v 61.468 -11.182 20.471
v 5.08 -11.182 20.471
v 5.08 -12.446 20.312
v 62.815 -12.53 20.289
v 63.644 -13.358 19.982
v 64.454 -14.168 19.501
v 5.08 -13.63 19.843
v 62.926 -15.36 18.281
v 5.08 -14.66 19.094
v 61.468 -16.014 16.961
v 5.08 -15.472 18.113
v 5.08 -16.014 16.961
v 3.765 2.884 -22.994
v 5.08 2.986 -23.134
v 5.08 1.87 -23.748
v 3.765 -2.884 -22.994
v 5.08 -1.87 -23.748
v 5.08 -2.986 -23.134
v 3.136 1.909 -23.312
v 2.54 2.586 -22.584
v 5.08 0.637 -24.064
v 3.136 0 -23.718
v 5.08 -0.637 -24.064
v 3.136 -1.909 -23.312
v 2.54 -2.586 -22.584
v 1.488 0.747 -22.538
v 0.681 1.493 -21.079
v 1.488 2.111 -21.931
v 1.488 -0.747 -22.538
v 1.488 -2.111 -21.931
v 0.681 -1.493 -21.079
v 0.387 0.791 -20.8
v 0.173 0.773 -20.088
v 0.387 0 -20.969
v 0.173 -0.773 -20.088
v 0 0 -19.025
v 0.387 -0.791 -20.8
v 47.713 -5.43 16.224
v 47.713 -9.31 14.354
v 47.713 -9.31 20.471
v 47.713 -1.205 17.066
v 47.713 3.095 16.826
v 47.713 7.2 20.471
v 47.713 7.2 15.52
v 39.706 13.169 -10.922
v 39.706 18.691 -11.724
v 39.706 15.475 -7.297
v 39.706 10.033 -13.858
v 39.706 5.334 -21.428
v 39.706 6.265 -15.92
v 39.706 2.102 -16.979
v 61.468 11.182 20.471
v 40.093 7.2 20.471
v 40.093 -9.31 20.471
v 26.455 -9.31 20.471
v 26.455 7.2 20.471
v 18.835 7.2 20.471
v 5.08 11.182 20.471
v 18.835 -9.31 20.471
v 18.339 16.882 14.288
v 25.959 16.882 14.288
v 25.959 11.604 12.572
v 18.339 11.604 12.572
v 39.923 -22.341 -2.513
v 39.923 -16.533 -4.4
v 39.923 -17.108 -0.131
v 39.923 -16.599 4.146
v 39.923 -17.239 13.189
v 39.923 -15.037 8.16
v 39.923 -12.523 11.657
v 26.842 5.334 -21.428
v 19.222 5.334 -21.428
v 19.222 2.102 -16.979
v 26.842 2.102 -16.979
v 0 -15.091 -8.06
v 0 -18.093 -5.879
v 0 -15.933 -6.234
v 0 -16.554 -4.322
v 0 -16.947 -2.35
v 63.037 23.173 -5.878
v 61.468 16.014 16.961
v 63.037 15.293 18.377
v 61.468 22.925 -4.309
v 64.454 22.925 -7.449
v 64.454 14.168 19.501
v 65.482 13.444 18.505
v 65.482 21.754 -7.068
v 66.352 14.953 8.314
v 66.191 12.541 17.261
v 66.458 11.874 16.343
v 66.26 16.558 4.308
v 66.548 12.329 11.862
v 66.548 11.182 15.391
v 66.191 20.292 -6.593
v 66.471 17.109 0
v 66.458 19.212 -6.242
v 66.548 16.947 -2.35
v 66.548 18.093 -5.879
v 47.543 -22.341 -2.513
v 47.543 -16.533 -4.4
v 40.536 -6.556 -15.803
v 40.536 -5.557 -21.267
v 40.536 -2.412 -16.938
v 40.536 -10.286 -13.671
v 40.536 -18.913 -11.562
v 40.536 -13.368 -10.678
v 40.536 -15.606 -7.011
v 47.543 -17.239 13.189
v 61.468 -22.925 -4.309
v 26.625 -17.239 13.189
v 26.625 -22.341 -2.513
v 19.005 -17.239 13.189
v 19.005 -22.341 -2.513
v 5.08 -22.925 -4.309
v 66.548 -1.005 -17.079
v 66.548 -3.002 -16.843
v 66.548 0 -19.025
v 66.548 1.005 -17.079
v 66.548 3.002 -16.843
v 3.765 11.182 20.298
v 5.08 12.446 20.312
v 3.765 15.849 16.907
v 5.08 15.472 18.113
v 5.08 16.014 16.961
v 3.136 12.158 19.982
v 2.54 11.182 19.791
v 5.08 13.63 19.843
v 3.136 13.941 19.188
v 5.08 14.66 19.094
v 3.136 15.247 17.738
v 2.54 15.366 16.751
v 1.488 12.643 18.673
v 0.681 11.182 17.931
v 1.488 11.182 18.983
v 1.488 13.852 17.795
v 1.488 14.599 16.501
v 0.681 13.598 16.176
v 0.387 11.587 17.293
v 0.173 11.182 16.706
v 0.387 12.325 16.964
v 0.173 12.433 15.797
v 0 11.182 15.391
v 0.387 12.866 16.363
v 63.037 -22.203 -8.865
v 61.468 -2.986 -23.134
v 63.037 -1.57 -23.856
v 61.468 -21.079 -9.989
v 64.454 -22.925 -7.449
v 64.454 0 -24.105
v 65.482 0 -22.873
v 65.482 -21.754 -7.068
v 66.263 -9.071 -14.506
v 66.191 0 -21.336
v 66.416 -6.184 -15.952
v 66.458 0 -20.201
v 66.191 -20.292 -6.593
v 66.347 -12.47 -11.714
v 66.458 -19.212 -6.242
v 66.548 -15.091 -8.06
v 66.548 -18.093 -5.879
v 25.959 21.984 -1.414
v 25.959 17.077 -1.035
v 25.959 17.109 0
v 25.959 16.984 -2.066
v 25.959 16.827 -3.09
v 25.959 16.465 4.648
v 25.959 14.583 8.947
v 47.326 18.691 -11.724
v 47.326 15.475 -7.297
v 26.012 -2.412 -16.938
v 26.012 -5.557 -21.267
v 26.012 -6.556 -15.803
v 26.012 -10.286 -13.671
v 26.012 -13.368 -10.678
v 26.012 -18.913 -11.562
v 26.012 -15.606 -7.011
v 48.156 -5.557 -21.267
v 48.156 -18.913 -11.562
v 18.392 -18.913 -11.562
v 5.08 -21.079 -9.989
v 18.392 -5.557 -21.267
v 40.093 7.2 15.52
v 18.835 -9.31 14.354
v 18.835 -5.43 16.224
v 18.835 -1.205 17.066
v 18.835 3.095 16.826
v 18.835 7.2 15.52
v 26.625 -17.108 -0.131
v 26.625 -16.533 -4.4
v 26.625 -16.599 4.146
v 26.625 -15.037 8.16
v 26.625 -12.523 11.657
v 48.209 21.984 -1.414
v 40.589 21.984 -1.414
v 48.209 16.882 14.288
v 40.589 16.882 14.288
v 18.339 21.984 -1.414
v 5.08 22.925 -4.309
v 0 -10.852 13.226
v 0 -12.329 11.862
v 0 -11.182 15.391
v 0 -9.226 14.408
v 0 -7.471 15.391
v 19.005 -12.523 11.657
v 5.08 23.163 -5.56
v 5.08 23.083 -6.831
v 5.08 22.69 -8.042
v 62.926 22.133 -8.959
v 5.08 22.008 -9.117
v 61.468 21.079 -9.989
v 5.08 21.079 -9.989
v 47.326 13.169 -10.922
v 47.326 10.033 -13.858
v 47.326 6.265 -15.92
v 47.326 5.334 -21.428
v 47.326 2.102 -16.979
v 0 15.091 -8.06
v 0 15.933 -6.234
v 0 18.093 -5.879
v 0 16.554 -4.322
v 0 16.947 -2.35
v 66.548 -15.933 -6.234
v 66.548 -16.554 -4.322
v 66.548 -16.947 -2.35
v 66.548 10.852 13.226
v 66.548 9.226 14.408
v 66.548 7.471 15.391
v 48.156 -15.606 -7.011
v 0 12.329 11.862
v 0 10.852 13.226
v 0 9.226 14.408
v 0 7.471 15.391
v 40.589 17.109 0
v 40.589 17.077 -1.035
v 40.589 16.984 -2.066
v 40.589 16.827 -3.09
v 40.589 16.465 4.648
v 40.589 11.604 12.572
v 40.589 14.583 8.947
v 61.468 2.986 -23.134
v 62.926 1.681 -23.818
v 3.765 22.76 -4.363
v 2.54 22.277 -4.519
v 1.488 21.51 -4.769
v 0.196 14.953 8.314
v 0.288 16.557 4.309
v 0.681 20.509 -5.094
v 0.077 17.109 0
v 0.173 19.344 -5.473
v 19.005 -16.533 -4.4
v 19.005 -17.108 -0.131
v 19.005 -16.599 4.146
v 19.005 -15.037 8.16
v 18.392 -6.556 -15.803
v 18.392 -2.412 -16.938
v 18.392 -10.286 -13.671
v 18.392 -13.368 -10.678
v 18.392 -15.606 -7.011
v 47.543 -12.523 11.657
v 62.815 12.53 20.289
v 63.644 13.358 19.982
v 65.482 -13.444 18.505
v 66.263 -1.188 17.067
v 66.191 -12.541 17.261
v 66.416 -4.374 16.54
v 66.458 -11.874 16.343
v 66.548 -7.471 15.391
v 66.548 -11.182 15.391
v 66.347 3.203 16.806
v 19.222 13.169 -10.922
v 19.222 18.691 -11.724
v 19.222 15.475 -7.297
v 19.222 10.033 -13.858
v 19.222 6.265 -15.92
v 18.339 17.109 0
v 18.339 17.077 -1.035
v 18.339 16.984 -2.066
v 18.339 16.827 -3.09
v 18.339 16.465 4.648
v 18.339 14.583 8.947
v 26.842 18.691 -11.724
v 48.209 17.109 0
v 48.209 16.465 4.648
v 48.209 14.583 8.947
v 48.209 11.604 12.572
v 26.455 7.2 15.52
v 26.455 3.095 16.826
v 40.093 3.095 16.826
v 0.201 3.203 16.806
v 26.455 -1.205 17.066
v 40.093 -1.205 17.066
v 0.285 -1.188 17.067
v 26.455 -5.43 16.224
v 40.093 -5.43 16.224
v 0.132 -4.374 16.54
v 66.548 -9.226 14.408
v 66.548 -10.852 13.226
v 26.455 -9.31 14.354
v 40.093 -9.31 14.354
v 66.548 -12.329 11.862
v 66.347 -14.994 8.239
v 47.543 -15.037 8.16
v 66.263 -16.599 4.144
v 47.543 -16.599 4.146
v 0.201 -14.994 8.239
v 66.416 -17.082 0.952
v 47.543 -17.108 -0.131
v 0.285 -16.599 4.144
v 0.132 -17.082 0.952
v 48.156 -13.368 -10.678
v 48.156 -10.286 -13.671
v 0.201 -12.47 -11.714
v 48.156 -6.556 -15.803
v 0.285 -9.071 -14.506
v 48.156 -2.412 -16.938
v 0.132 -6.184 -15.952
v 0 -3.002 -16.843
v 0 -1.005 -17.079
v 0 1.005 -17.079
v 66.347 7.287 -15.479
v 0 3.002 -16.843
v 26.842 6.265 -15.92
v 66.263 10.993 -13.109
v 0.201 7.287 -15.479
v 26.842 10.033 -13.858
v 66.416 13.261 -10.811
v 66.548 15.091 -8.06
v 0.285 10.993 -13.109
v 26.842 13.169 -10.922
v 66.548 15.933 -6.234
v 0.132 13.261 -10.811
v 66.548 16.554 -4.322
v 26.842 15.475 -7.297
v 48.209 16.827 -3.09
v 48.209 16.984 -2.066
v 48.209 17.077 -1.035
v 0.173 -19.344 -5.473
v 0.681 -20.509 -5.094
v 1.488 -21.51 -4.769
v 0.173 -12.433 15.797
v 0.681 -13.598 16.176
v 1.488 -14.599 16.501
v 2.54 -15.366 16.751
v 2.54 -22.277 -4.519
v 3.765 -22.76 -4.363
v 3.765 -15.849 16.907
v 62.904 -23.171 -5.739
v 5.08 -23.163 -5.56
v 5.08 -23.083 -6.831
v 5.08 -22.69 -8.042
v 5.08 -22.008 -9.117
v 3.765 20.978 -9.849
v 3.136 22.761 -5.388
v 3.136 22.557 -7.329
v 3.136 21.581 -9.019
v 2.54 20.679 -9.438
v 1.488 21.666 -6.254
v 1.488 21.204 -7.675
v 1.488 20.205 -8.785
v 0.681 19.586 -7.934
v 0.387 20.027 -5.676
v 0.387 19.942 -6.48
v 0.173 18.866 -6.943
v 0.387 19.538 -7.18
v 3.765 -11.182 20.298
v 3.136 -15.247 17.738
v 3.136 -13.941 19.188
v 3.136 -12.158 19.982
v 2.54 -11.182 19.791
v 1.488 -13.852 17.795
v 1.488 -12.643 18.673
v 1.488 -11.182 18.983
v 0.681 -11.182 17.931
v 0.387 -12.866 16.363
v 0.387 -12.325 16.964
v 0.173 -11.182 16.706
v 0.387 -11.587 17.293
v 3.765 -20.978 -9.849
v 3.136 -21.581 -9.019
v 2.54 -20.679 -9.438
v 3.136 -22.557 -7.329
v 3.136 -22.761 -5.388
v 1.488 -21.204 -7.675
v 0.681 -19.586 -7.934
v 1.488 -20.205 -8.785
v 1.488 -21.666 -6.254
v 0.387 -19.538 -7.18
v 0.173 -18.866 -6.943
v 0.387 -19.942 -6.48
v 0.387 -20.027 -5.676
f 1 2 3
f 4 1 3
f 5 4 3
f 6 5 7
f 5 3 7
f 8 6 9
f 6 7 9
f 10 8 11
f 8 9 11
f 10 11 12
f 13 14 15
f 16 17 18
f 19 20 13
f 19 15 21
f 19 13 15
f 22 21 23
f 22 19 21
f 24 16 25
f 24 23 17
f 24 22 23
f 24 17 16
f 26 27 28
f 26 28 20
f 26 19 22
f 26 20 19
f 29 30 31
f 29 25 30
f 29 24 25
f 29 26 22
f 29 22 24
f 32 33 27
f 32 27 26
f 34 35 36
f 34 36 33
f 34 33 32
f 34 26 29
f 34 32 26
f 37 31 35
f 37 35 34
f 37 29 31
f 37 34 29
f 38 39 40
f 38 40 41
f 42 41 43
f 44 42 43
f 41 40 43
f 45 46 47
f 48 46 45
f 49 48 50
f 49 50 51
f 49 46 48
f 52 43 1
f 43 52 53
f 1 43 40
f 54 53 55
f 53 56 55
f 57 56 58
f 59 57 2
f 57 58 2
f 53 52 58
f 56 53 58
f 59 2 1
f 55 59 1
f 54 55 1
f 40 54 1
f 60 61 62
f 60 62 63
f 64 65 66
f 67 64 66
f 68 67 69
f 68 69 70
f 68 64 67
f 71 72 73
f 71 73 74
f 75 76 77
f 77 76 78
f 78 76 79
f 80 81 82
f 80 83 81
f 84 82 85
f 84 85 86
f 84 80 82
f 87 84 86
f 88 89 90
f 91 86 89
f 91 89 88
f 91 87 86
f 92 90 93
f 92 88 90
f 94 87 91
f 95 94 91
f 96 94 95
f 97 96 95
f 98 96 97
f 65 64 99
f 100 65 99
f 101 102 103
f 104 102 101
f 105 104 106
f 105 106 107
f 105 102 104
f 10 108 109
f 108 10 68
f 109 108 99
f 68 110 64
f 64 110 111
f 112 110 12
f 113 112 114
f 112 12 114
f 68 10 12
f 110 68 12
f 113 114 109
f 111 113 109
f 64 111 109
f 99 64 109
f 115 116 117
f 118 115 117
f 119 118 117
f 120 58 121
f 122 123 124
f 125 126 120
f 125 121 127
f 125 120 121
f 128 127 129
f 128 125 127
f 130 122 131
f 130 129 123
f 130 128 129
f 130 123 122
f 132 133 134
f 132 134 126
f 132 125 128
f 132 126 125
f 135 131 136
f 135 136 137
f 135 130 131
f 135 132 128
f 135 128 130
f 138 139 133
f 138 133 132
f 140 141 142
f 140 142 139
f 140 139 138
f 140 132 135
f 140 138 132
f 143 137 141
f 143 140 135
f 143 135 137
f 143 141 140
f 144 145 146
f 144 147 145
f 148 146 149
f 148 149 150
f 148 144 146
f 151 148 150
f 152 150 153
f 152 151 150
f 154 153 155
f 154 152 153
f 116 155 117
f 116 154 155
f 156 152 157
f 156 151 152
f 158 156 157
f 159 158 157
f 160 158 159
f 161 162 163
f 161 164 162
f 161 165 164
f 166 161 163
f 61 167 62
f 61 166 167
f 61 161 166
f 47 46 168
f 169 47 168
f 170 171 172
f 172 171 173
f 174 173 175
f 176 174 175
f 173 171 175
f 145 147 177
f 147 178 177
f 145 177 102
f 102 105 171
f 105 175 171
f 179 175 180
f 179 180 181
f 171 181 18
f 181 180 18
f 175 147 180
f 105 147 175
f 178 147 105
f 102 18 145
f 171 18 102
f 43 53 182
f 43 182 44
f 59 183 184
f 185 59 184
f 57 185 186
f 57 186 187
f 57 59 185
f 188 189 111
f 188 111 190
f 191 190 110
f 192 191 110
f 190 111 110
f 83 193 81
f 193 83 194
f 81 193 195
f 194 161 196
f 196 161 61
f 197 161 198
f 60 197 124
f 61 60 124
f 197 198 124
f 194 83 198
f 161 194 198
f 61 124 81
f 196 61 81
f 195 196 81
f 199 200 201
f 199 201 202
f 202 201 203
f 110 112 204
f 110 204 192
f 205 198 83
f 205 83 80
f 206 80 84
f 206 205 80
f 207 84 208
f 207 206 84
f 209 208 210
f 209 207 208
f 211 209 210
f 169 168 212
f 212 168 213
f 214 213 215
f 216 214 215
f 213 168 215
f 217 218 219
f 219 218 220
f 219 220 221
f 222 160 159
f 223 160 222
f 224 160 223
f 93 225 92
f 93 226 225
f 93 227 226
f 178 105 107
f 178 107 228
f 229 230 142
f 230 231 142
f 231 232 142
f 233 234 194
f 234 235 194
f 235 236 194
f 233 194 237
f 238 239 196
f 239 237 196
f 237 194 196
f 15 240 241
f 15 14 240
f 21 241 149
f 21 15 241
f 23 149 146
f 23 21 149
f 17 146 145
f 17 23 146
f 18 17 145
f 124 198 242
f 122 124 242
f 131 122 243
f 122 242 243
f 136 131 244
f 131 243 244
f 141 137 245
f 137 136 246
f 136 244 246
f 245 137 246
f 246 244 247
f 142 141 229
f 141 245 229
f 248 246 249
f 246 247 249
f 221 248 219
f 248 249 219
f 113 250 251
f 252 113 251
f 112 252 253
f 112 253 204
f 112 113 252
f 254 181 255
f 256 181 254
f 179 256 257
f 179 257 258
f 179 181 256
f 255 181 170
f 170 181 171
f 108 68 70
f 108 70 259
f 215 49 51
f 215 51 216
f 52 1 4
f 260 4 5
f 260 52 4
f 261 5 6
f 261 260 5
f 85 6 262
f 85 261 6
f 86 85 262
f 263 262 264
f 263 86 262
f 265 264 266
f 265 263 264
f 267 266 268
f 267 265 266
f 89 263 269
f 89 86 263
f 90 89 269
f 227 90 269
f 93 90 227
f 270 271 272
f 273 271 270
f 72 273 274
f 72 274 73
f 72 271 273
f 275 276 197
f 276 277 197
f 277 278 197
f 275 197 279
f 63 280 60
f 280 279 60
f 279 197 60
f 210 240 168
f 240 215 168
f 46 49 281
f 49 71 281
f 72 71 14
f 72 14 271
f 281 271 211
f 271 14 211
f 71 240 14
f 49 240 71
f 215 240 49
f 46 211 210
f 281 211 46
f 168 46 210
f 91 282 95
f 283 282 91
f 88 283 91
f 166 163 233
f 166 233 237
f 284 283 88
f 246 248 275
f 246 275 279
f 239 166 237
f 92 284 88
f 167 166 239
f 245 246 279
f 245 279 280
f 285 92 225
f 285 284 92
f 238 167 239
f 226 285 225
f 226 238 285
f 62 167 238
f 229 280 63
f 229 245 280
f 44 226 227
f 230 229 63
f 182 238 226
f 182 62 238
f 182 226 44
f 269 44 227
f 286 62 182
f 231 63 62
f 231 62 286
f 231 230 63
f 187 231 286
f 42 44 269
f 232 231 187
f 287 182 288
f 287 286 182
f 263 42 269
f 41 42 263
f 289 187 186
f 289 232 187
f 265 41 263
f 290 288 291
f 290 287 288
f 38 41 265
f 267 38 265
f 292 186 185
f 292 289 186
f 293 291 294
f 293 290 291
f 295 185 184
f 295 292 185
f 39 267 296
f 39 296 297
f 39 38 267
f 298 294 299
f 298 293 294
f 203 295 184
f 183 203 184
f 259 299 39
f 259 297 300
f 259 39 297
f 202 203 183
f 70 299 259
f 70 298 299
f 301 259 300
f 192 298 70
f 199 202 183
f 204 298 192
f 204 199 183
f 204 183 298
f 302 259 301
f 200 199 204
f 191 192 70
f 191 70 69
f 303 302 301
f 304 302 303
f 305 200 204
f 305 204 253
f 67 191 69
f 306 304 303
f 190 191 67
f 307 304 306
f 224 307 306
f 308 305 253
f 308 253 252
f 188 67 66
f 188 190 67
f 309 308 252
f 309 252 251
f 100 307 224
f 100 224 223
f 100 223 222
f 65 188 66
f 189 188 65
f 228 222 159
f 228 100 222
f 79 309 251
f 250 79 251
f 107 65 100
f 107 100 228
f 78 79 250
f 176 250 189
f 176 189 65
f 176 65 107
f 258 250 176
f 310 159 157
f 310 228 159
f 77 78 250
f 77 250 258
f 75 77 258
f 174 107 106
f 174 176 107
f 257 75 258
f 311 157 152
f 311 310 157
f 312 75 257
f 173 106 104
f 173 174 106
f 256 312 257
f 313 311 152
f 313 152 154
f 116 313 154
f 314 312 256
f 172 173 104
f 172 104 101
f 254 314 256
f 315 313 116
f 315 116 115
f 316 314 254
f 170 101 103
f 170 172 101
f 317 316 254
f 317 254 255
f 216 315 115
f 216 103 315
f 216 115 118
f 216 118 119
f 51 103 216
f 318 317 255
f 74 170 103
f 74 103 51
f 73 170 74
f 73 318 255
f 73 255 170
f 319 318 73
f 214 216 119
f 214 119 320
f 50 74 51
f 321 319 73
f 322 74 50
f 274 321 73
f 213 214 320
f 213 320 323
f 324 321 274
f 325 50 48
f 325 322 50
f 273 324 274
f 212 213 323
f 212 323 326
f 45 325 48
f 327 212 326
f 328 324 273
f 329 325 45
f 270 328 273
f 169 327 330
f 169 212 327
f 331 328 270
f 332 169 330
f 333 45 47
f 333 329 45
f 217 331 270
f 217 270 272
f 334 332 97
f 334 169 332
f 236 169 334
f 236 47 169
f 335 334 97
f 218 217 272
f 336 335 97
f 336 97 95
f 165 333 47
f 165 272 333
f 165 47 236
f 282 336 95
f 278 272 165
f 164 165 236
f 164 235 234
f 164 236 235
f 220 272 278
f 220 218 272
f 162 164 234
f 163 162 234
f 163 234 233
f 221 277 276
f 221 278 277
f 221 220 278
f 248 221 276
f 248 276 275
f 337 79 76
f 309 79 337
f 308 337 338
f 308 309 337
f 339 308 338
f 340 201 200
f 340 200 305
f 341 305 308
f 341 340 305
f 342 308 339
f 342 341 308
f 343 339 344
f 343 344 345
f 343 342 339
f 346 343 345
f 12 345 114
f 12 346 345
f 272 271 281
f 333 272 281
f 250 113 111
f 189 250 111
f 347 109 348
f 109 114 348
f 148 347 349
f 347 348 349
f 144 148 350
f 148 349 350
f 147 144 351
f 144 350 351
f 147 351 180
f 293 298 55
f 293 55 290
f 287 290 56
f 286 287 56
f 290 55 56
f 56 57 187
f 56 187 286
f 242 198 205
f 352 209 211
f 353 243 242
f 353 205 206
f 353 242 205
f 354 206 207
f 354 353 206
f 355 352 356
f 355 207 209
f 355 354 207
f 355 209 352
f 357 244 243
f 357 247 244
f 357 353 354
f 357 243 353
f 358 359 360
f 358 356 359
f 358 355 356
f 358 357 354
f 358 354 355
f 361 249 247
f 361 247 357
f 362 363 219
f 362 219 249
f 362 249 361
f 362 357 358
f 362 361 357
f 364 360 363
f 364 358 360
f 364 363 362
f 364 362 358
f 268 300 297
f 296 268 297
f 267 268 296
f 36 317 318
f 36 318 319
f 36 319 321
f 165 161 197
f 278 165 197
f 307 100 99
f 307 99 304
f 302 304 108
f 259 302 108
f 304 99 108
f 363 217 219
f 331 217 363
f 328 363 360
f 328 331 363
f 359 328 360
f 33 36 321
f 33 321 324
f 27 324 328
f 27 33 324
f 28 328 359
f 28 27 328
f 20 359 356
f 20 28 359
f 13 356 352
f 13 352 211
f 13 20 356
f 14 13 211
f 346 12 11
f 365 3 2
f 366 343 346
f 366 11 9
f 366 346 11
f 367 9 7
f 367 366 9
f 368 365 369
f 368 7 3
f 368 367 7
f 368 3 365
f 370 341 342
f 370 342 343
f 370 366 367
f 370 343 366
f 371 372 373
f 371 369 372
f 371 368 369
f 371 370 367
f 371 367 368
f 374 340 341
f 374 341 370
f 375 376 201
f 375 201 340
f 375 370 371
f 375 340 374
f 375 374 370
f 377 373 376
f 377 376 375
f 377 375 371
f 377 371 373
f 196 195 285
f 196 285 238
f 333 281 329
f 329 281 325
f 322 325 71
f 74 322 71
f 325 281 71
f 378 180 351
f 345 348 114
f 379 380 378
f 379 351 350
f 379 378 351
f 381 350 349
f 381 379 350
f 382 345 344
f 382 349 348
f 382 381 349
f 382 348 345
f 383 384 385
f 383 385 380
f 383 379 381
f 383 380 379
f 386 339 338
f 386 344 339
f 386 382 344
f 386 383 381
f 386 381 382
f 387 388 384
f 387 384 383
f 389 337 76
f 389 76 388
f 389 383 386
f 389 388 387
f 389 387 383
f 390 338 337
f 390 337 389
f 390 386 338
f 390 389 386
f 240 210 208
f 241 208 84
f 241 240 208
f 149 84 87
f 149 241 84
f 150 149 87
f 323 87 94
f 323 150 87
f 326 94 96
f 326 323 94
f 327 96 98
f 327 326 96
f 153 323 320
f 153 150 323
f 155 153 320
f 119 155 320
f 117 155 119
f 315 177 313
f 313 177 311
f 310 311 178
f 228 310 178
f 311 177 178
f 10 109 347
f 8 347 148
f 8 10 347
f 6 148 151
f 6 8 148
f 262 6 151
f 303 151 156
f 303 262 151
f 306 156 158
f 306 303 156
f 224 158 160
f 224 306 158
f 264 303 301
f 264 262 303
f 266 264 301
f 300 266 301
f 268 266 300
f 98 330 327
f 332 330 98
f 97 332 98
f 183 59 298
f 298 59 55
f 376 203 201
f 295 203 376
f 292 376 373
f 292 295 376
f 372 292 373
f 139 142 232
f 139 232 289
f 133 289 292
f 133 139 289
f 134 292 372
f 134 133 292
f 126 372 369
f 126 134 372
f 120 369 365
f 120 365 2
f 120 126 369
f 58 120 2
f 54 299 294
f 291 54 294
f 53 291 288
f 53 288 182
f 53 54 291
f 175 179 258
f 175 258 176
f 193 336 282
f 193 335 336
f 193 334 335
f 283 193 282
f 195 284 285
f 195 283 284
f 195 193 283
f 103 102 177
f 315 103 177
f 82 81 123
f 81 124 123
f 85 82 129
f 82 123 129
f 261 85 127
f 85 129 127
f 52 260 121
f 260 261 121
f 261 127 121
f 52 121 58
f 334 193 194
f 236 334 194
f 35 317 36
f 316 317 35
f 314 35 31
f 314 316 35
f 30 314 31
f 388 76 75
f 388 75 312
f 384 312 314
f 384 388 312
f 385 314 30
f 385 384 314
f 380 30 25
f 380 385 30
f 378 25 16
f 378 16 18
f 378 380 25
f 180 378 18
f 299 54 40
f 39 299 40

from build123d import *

# Parameters (mm, degrees)
F0_R         = 17.1087851354
F1_DEPTH     = 66.548
F2_T1_DEPTH  = 55.1463138897
F2_T3_DEPTH  = 55.1463138897
F2_T5_DEPTH  = 55.1463138897
F2_T7_DEPTH  = 55.1463138897
F2_T9_DEPTH  = 55.1463138897
F3_T1_DEPTH  = 22.3646418052
F3_T3_DEPTH  = 22.3646418052
F3_T5_DEPTH  = 22.3646418052
F3_T7_DEPTH  = 22.3646418052
F3_T9_DEPTH  = 22.3646418052
F3_T11_DEPTH = 65.6150901057
F3_T16_DEPTH = 5.1816
F3_T22_DEPTH = 5.1816
F3_T28_DEPTH = 5.1816
F3_T34_DEPTH = 5.1816
F3_T40_DEPTH = 5.1816
F4_W         = 7.62
F4_H         = 16.51
F5_DEPTH     = 7.874
F6_W         = 7.62
F6_H         = 16.51
F7_DEPTH     = 7.112
F8_W         = 7.62
F8_H         = 16.51
F9_DEPTH     = 12.192
F10_W        = 7.62
F10_H        = 16.51
F11_DEPTH    = 24.384
F12_W        = 7.62
F12_H        = 16.51
F13_DEPTH    = 25.4


# Not quite as in the source:
# - a fillet or chamfer that OpenCascade refuses, or shapes differently, is made with other operations: its cross-section is extruded or revolved along the edge and cut away or added


with BuildPart() as f1:
    # F0 (on Right) → F1 (new body)
    with BuildSketch(Plane.YZ):
        Polygon((14.8731569449, 20.4711443192), (-14.8731569449, 20.4711443192), (-24.0652734568, -7.8192813413), (0, -25.3037259558), (24.0652734568, -7.8192813413), align=None)
        Circle(F0_R, mode=Mode.SUBTRACT)
    extrude(amount=F1_DEPTH)

    # F2: fillet of radius 5.08 on 5 edges, made by hand

    # F2_s2 → F2_t1 (cut)
    with BuildSketch(Plane(origin=(0, 8.5205740845, 26.2236305872), x_dir=(1, 0, 0), z_dir=(0, -0.3090169944, -0.9510565163))):
        with BuildLine():
            ThreePointArc((61.468, 20.4711443192), (65.0601024484, 18.9832467676), (66.548, 15.3911443192))
            Line((66.548, 15.3911443192), (66.548, 20.4711443192))
            Line((66.548, 20.4711443192), (61.468, 20.4711443192))
        make_face()
    extrude(amount=F2_T1_DEPTH, mode=Mode.SUBTRACT)

    # F2_s4 → F2_t3 (cut)
    with BuildSketch(Plane.XZ.offset(-27.5731569449)):
        with BuildLine():
            ThreePointArc((61.468, 20.4711443192), (65.0601024484, 18.9832467676), (66.548, 15.3911443192))
            Line((66.548, 15.3911443192), (66.548, 20.4711443192))
            Line((66.548, 20.4711443192), (61.468, 20.4711443192))
        make_face()
    extrude(amount=F2_T3_DEPTH, mode=Mode.SUBTRACT)

    # F2_s6 → F2_t5 (cut)
    with BuildSketch(Plane(origin=(0, 8.5205740845, -26.2236305872), x_dir=(1, 0, 0), z_dir=(0, -0.3090169944, 0.9510565163))):
        with BuildLine():
            ThreePointArc((61.468, 20.4711443192), (65.0601024484, 18.9832467676), (66.548, 15.3911443192))
            Line((66.548, 15.3911443192), (66.548, 20.4711443192))
            Line((66.548, 20.4711443192), (61.468, 20.4711443192))
        make_face()
    extrude(amount=F2_T5_DEPTH, mode=Mode.SUBTRACT)

    # F2_s8 → F2_t7 (cut)
    with BuildSketch(Plane(origin=(0, -22.307152557, -16.2070950113), x_dir=(1, 0, 0), z_dir=(0, 0.8090169944, 0.5877852523))):
        with BuildLine():
            ThreePointArc((61.468, 20.4711443192), (65.0601024484, 18.9832467676), (66.548, 15.3911443192))
            Line((66.548, 15.3911443192), (66.548, 20.4711443192))
            Line((66.548, 20.4711443192), (61.468, 20.4711443192))
        make_face()
    extrude(amount=F2_T7_DEPTH, mode=Mode.SUBTRACT)

    # F2_s10 → F2_t9 (cut)
    with BuildSketch(Plane(origin=(0, -22.307152557, 16.2070950113), x_dir=(1, 0, 0), z_dir=(0, 0.8090169944, -0.5877852523))):
        with BuildLine():
            ThreePointArc((61.468, 20.4711443192), (65.0601024484, 18.9832467676), (66.548, 15.3911443192))
            Line((66.548, 15.3911443192), (66.548, 20.4711443192))
            Line((66.548, 20.4711443192), (61.468, 20.4711443192))
        make_face()
    extrude(amount=F2_T9_DEPTH, mode=Mode.SUBTRACT)

    # F3: fillet of radius 5.08 on 14 edges, made by hand

    # F3_s2 → F3_t1 (cut)
    with BuildSketch(Plane(origin=(0, 3.4555271955, -10.6350191617), x_dir=(1, 0, 0), z_dir=(0, -0.3090169944, 0.9510565163))):
        with BuildLine():
            ThreePointArc((5.08, 20.4711443192), (1.4878975516, 18.9832467676), (0, 15.3911443192))
            Line((0, 15.3911443192), (0, 20.4711443192))
            Line((0, 20.4711443192), (5.08, 20.4711443192))
        make_face()
    extrude(amount=F3_T1_DEPTH, mode=Mode.SUBTRACT)

    # F3_s4 → F3_t3 (cut)
    with BuildSketch(Plane.XZ.offset(-11.1823209026)):
        with BuildLine():
            ThreePointArc((0, 15.3911443192), (1.4878975516, 18.9832467676), (5.08, 20.4711443192))
            Line((5.08, 20.4711443192), (0, 20.4711443192))
            Line((0, 20.4711443192), (0, 15.3911443192))
        make_face()
    extrude(amount=F3_T3_DEPTH, mode=Mode.SUBTRACT)

    # F3_s6 → F3_t5 (cut)
    with BuildSketch(Plane(origin=(0, 3.4555271955, 10.6350191617), x_dir=(1, 0, 0), z_dir=(0, -0.3090169944, -0.9510565163))):
        with BuildLine():
            ThreePointArc((0, 15.3911443192), (1.4878975516, 18.9832467676), (5.08, 20.4711443192))
            Line((5.08, 20.4711443192), (0, 20.4711443192))
            Line((0, 20.4711443192), (0, 15.3911443192))
        make_face()
    extrude(amount=F3_T5_DEPTH, mode=Mode.SUBTRACT)

    # F3_s8 → F3_t7 (cut)
    with BuildSketch(Plane(origin=(0, -9.0466876467, 6.5728033129), x_dir=(1, 0, 0), z_dir=(0, 0.8090169944, -0.5877852523))):
        with BuildLine():
            ThreePointArc((0, 15.3911443192), (1.4878975516, 18.9832467676), (5.08, 20.4711443192))
            Line((5.08, 20.4711443192), (0, 20.4711443192))
            Line((0, 20.4711443192), (0, 15.3911443192))
        make_face()
    extrude(amount=F3_T7_DEPTH, mode=Mode.SUBTRACT)

    # F3_s10 → F3_t9 (cut)
    with BuildSketch(Plane(origin=(0, -9.0466876467, -6.5728033129), x_dir=(1, 0, 0), z_dir=(0, 0.8090169944, 0.5877852523))):
        with BuildLine():
            ThreePointArc((0, 15.3911443192), (1.4878975516, 18.9832467676), (5.08, 20.4711443192))
            Line((5.08, 20.4711443192), (0, 20.4711443192))
            Line((0, 20.4711443192), (0, 15.3911443192))
        make_face()
    extrude(amount=F3_T9_DEPTH, mode=Mode.SUBTRACT)

    # F3_s12 → F3_t11 (cut)
    with BuildSketch(Plane.YZ.offset(5.08)):
        with BuildLine():
            ThreePointArc((-22.9247423963, -4.3090876728), (-22.9247423963, -7.4487003356), (-21.0793243751, -9.9887003356))
            Line((-21.0793243751, -9.9887003356), (-24.0652734568, -7.8192813413))
            Line((-24.0652734568, -7.8192813413), (-22.9247423963, -4.3090876728))
        make_face()
        with BuildLine():
            ThreePointArc((-11.1823209026, 20.4711443192), (-14.1682699842, 19.5009506506), (-16.0136880054, 16.9609506506))
            Line((-16.0136880054, 16.9609506506), (-14.8731569449, 20.4711443192))
            Line((-14.8731569449, 20.4711443192), (-11.1823209026, 20.4711443192))
        make_face()
        with BuildLine():
            ThreePointArc((2.9859490816, -23.1343069615), (0, -24.1045006301), (-2.9859490816, -23.1343069615))
            Line((-2.9859490816, -23.1343069615), (0, -25.3037259558))
            Line((0, -25.3037259558), (2.9859490816, -23.1343069615))
        make_face()
        with BuildLine():
            ThreePointArc((22.9247423963, -4.3090876728), (22.9247423963, -7.4487003356), (21.0793243751, -9.9887003356))
            Line((21.0793243751, -9.9887003356), (24.0652734568, -7.8192813413))
            Line((24.0652734568, -7.8192813413), (22.9247423963, -4.3090876728))
        make_face()
        with BuildLine():
            ThreePointArc((16.0136880054, 16.9609506506), (14.1682699842, 19.5009506506), (11.1823209026, 20.4711443192))
            Line((11.1823209026, 20.4711443192), (14.8731569449, 20.4711443192))
            Line((14.8731569449, 20.4711443192), (16.0136880054, 16.9609506506))
        make_face()
    extrude(amount=F3_T11_DEPTH, mode=Mode.SUBTRACT)


with BuildPart() as f3_tool14:
    # F3_s15 → F3_t16 (new body)
    with BuildSketch(Plane.YZ.offset(5.08)):
        Polygon((18.0933752935, -5.8788940042), (21.1390433568, -10.0708964622), (24.18471142, -7.8580890881), (23.0213697383, -4.2776915461), align=None)
    extrude(amount=-F3_T16_DEPTH)

    # F3_s17 → F3_t18 (revolve, cut)
    with BuildSketch(Plane(origin=(5.08, 18.0933752935, -5.8788940042), x_dir=(0, -0.9510565163, 0.3090169944), z_dir=(0, -0.3090169944, -0.9510565163))):
        with BuildLine():
            ThreePointArc((0, -5.08), (5.08, 0), (0, 5.08))
            Line((0, 5.08), (0, -5.08))
        make_face()
    revolve(axis=Axis((5.08, 18.0933752935, -5.8788940042), (-1, 0, 0)), mode=Mode.SUBTRACT)


with BuildPart() as f1_1:
    add(f1.part)

    # F3_t13: cut F3_tool14
    add(f3_tool14.part, mode=Mode.SUBTRACT)


with BuildPart() as f3_tool20:
    # F3_s21 → F3_t22 (new body)
    with BuildSketch(Plane.YZ.offset(5.08)):
        Polygon((11.1823209026, 15.3911443192), (11.1823209026, 20.5727443192), (14.9469736657, 20.5727443192), (16.1103153474, 16.9923467773), align=None)
    extrude(amount=-F3_T22_DEPTH)

    # F3_s23 → F3_t24 (revolve, cut)
    with BuildSketch(Plane(origin=(5.08, 11.1823209026, 15.3911443192), x_dir=(0, -0.5877852523, -0.8090169944), z_dir=(0, 0.8090169944, -0.5877852523))):
        with BuildLine():
            ThreePointArc((0, -5.08), (5.08, 0), (0, 5.08))
            Line((0, 5.08), (0, -5.08))
        make_face()
    revolve(axis=Axis((5.08, 11.1823209026, 15.3911443192), (-1, 0, 0)), mode=Mode.SUBTRACT)


with BuildPart() as f1_2:
    add(f1_1.part)

    # F3_t19: cut F3_tool20
    add(f3_tool20.part, mode=Mode.SUBTRACT)


with BuildPart() as f3_tool26:
    # F3_s27 → F3_t28 (new body)
    with BuildSketch(Plane.YZ.offset(5.08)):
        Polygon((-11.1823209026, 15.3911443192), (-11.1823209026, 20.5727443192), (-14.9469736657, 20.5727443192), (-16.1103153474, 16.9923467773), align=None)
    extrude(amount=-F3_T28_DEPTH)

    # F3_s29 → F3_t30 (revolve, cut)
    with BuildSketch(Plane(origin=(5.08, -11.1823209026, 15.3911443192), x_dir=(0, 0.5877852523, -0.8090169944), z_dir=(0, 0.8090169944, 0.5877852523))):
        with BuildLine():
            ThreePointArc((0, -5.08), (5.08, 0), (0, 5.08))
            Line((0, 5.08), (0, -5.08))
        make_face()
    revolve(axis=Axis((5.08, -11.1823209026, 15.3911443192), (-1, 0, 0)), mode=Mode.SUBTRACT)


with BuildPart() as f1_3:
    add(f1_2.part)

    # F3_t25: cut F3_tool26
    add(f3_tool26.part, mode=Mode.SUBTRACT)


with BuildPart() as f3_tool32:
    # F3_s33 → F3_t34 (new body)
    with BuildSketch(Plane.YZ.offset(5.08)):
        Polygon((-18.0933752935, -5.8788940042), (-23.0213697383, -4.2776915461), (-24.18471142, -7.8580890881), (-21.1390433568, -10.0708964622), align=None)
    extrude(amount=-F3_T34_DEPTH)

    # F3_s35 → F3_t36 (revolve, cut)
    with BuildSketch(Plane(origin=(5.08, -18.0933752935, -5.8788940042), x_dir=(0, 0.9510565163, 0.3090169944), z_dir=(0, -0.3090169944, 0.9510565163))):
        with BuildLine():
            ThreePointArc((0, -5.08), (5.08, 0), (0, 5.08))
            Line((0, 5.08), (0, -5.08))
        make_face()
    revolve(axis=Axis((5.08, -18.0933752935, -5.8788940042), (-1, 0, 0)), mode=Mode.SUBTRACT)


with BuildPart() as f1_4:
    add(f1_3.part)

    # F3_t31: cut F3_tool32
    add(f3_tool32.part, mode=Mode.SUBTRACT)


with BuildPart() as f3_tool38:
    # F3_s39 → F3_t40 (new body)
    with BuildSketch(Plane.YZ.offset(5.08)):
        Polygon((0, -19.0245006301), (3.0456680633, -23.2165030881), (0, -25.4293104623), (-3.0456680633, -23.2165030881), align=None)
    extrude(amount=-F3_T40_DEPTH)

    # F3_s41 → F3_t42 (revolve, cut)
    with BuildSketch(Plane(origin=(5.08, 0, -19.0245006301), x_dir=(0, 0, 1), z_dir=(0, -1, 0))):
        with BuildLine():
            ThreePointArc((0, -5.08), (5.08, 0), (0, 5.08))
            Line((0, 5.08), (0, -5.08))
        make_face()
    revolve(axis=Axis((5.08, 0, -19.0245006301), (-1, 0, 0)), mode=Mode.SUBTRACT)


with BuildPart() as f1_5:
    add(f1_4.part)

    # F3_t37: cut F3_tool38
    add(f3_tool38.part, mode=Mode.SUBTRACT)

    # F4 (on face) → F5 (cut)
    with BuildSketch(Plane(origin=(0, 19.4692152008, 6.3259314889), x_dir=(-1, 0, 0), z_dir=(0, 0.9510565163, 0.3090169944))):
        with Locations((-44.3987917626, 0.1162888882)):
            Rectangle(F4_W, F4_H)
        with Locations((-22.1492082374, 0.1162888882)):
            Rectangle(F4_W, F4_H)
    extrude(amount=-F5_DEPTH, mode=Mode.SUBTRACT)

    # F6 (on face) → F7 (cut)
    with BuildSketch(Plane(origin=(0, 12.0326367284, -16.5615036486), x_dir=(1, 0, 0), z_dir=(0, 0.5877852523, -0.8090169944))):
        with Locations((23.0322839265, 0.0248623613)):
            Rectangle(F6_W, F6_H)
        with Locations((43.5157160735, 0.0248623613)):
            Rectangle(F6_W, F6_H)
    extrude(amount=-F7_DEPTH, mode=Mode.SUBTRACT)

    # F8 (on face) → F9 (cut)
    with BuildSketch(Plane.XY.offset(20.4711443192)):
        with Locations((22.6449199492, -1.054919551)):
            Rectangle(F8_W, F8_H)
        with Locations((43.9030800508, -1.054919551)):
            Rectangle(F8_W, F8_H)
    extrude(amount=-F9_DEPTH, mode=Mode.SUBTRACT)

    # F10 (on face) → F11 (cut)
    with BuildSketch(Plane(origin=(0, -19.4692152008, 6.3259314889), x_dir=(1, 0, 0), z_dir=(0, -0.9510565163, 0.3090169944))):
        with Locations((22.8148490661, -1.0384099957)):
            Rectangle(F10_W, F10_H)
        with Locations((43.7331509339, -1.0384099957)):
            Rectangle(F10_W, F10_H)
    extrude(amount=-F11_DEPTH, mode=Mode.SUBTRACT)

    # F12 (on face) → F13 (cut)
    with BuildSketch(Plane(origin=(0, -12.0326367284, -16.5615036486), x_dir=(1, 0, 0), z_dir=(0, -0.5877852523, -0.8090169944))):
        with Locations((22.2020648891, 0.2502023774)):
            Rectangle(F12_W, F12_H)
        with Locations((44.3459351109, 0.2502023774)):
            Rectangle(F12_W, F12_H)
    extrude(amount=-F13_DEPTH, mode=Mode.SUBTRACT)


solid = f1_5.part
